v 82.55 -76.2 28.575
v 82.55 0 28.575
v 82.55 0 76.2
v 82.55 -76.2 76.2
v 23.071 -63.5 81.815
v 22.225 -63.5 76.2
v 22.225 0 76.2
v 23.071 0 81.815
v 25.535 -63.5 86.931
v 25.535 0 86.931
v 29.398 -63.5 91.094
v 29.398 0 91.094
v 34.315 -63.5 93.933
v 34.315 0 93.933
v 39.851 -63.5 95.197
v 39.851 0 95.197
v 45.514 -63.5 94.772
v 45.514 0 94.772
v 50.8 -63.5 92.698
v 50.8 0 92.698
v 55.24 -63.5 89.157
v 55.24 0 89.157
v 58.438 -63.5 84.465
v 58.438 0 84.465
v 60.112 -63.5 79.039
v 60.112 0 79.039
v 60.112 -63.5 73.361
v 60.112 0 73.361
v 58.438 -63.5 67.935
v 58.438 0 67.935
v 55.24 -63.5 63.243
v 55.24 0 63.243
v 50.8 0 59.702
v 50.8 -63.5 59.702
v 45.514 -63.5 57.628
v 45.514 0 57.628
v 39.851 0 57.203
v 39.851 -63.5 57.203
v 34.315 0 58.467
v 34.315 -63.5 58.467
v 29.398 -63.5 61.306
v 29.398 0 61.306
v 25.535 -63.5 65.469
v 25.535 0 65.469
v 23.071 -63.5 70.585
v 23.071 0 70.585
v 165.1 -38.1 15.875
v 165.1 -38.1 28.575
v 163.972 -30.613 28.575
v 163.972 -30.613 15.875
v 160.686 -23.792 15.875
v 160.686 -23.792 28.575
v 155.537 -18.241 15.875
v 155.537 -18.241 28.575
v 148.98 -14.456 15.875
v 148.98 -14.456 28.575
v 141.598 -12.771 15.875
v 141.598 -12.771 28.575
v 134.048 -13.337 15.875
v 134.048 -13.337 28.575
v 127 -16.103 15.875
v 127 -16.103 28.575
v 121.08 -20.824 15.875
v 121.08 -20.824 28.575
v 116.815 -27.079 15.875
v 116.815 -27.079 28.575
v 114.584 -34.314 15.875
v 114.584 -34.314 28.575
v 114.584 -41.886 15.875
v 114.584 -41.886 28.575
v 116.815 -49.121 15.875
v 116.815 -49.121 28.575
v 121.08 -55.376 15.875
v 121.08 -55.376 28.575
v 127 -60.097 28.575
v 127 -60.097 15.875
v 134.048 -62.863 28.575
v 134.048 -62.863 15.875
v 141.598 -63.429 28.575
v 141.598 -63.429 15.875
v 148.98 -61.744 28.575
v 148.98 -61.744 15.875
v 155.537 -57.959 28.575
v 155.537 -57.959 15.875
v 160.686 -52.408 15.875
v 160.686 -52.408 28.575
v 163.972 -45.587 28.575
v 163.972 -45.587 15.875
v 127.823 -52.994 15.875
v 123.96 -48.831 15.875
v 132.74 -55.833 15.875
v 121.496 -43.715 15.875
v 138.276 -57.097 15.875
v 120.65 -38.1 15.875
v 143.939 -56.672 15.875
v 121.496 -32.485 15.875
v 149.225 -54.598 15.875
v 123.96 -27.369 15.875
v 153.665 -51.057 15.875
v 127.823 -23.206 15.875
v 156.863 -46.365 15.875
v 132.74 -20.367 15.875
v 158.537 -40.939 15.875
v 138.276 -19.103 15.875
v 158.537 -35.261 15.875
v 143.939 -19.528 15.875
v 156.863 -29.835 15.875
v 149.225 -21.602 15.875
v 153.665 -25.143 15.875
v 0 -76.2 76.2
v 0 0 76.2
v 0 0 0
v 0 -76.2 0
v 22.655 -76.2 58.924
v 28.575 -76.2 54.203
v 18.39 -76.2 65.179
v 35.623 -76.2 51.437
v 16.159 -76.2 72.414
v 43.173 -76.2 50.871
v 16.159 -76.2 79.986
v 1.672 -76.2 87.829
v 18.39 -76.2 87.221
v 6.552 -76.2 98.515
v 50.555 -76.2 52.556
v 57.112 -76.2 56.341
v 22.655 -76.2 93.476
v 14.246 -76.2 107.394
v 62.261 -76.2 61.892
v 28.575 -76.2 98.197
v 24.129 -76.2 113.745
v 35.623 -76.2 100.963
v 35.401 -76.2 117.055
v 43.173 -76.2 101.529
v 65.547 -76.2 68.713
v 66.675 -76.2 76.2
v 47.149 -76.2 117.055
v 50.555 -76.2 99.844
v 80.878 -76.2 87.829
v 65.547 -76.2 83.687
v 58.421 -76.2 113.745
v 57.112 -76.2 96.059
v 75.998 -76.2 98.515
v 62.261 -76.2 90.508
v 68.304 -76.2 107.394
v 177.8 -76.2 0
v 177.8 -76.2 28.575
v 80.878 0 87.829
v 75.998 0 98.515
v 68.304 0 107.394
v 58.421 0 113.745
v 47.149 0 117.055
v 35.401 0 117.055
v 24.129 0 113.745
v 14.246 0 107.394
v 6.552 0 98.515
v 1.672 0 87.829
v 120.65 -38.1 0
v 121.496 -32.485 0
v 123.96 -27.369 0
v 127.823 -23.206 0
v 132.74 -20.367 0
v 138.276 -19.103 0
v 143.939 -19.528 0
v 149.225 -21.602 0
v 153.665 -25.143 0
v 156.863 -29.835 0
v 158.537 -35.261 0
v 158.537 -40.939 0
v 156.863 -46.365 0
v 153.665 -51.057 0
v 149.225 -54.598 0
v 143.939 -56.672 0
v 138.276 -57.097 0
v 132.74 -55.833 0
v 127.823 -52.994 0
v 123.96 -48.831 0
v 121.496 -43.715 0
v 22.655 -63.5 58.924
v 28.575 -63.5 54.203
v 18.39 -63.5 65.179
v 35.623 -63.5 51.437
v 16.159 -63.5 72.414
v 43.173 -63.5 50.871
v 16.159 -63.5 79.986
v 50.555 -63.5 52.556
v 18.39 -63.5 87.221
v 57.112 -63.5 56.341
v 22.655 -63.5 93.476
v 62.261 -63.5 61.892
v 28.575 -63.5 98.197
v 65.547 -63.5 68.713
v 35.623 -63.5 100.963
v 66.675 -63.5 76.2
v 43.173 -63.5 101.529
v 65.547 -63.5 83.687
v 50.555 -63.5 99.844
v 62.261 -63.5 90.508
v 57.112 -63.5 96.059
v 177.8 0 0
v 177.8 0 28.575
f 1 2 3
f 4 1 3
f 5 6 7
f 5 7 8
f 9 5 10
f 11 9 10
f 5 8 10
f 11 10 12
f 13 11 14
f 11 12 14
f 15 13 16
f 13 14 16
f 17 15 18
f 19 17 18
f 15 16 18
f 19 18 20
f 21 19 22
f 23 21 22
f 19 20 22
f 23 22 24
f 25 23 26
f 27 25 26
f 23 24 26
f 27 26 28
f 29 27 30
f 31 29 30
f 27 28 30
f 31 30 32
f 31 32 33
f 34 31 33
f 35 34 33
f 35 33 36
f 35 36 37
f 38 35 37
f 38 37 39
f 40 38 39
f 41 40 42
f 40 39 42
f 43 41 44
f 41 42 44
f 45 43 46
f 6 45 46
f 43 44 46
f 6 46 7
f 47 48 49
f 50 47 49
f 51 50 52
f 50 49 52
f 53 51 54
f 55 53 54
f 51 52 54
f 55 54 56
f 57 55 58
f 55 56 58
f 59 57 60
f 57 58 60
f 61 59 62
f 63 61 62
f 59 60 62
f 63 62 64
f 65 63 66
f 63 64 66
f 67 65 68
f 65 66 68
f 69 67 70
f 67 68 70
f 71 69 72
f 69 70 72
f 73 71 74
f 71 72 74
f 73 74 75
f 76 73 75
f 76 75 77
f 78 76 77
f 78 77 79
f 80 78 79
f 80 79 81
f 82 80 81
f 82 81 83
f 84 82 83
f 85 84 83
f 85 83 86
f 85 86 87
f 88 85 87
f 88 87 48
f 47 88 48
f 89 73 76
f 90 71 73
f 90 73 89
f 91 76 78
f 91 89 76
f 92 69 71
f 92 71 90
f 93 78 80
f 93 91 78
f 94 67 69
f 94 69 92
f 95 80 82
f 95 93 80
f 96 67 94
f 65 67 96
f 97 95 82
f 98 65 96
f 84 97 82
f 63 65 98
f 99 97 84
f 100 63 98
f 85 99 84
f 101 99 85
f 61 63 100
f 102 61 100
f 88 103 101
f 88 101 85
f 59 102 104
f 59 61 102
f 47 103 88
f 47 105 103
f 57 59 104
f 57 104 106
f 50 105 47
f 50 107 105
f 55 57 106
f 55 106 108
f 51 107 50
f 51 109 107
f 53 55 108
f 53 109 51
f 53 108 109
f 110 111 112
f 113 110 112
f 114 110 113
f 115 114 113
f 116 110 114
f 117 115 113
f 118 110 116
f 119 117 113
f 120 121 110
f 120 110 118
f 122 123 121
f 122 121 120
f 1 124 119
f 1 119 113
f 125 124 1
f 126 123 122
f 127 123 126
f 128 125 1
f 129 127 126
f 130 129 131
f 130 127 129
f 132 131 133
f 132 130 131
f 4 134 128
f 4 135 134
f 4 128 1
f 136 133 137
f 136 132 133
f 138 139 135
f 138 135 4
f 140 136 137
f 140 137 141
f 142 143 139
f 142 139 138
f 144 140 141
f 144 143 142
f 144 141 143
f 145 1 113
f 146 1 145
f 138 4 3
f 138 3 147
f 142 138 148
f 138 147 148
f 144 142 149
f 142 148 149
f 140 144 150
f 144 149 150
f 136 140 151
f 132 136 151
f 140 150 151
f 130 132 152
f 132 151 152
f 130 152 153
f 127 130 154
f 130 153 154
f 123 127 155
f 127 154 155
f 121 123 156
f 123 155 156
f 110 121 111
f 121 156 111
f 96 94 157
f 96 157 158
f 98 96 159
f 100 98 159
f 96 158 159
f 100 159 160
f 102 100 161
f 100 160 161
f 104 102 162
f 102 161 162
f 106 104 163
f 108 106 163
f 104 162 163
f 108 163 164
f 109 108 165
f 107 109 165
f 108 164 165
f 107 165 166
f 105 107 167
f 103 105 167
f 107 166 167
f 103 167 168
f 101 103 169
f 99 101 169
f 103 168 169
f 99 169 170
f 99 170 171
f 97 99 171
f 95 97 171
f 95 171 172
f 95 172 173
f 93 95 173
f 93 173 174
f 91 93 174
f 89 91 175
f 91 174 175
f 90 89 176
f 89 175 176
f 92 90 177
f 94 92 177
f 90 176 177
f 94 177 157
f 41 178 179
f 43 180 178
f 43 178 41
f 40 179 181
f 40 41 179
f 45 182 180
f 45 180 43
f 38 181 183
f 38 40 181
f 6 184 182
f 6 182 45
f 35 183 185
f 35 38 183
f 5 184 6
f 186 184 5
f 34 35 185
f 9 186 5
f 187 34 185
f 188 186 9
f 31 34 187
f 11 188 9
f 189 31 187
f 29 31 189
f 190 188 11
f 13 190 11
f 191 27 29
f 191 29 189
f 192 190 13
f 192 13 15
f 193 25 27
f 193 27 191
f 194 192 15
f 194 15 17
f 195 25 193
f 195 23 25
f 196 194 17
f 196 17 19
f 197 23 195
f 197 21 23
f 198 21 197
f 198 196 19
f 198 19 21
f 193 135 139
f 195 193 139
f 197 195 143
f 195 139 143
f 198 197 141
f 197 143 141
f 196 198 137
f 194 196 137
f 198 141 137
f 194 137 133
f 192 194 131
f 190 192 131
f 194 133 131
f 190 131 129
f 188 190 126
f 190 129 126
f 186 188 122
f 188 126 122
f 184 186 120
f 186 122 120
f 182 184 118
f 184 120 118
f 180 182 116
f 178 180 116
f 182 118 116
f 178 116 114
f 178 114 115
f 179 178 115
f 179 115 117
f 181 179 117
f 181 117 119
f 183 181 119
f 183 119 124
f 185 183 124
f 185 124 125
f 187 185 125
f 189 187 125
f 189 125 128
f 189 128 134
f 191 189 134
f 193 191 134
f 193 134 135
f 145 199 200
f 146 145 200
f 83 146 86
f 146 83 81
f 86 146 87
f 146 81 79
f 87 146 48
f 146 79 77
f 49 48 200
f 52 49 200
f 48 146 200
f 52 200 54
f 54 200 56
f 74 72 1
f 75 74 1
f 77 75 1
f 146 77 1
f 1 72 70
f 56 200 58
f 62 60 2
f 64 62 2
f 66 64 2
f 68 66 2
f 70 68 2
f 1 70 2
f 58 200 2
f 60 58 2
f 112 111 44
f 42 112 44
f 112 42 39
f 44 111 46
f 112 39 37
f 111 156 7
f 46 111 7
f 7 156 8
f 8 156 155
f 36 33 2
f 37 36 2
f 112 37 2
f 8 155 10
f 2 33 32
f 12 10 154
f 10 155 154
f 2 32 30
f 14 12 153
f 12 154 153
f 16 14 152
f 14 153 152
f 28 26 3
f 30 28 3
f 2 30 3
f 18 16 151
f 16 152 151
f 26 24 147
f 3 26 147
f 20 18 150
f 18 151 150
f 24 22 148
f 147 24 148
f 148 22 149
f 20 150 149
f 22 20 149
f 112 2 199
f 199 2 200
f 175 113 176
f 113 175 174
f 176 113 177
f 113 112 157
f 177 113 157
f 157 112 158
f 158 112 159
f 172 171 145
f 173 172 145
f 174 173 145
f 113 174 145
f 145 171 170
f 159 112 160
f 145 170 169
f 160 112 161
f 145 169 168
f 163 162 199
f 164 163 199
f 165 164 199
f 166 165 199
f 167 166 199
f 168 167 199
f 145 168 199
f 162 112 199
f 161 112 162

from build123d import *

# Parameters (mm, degrees)
F1_DEPTH       = 76.2
F4_D           = 38.1
F4_CBORE_D     = 50.8
F4_CBORE_DEPTH = 12.7
F5_D           = 38.1
F5_CBORE_D     = 50.8
F5_CBORE_DEPTH = 12.7


with BuildPart() as f1:
    # F0 (on Front) → F1 (new body)
    with BuildSketch(Plane.XZ):
        with BuildLine():
            Line((0, 76.2), (0, 0))
            Line((0, 0), (177.8, 0))
            Line((177.8, 0), (177.8, 28.575))
            Line((177.8, 28.575), (82.55, 28.575))
            Line((82.55, 28.575), (82.55, 76.2))
            ThreePointArc((82.55, 76.2), (41.275, 117.475), (0, 76.2))
        make_face()
    extrude(amount=F1_DEPTH)

    # F4 (through all)
    with Locations(Plane.XZ.offset(76.2)):
        with Locations((41.275, 76.2)):
            CounterBoreHole(F4_D / 2, F4_CBORE_D / 2, F4_CBORE_DEPTH)

    # F5 (through all)
    with Locations(Plane.XY.offset(28.575)):
        with Locations((139.7, -38.1)):
            CounterBoreHole(F5_D / 2, F5_CBORE_D / 2, F5_CBORE_DEPTH)


solid = f1.part
